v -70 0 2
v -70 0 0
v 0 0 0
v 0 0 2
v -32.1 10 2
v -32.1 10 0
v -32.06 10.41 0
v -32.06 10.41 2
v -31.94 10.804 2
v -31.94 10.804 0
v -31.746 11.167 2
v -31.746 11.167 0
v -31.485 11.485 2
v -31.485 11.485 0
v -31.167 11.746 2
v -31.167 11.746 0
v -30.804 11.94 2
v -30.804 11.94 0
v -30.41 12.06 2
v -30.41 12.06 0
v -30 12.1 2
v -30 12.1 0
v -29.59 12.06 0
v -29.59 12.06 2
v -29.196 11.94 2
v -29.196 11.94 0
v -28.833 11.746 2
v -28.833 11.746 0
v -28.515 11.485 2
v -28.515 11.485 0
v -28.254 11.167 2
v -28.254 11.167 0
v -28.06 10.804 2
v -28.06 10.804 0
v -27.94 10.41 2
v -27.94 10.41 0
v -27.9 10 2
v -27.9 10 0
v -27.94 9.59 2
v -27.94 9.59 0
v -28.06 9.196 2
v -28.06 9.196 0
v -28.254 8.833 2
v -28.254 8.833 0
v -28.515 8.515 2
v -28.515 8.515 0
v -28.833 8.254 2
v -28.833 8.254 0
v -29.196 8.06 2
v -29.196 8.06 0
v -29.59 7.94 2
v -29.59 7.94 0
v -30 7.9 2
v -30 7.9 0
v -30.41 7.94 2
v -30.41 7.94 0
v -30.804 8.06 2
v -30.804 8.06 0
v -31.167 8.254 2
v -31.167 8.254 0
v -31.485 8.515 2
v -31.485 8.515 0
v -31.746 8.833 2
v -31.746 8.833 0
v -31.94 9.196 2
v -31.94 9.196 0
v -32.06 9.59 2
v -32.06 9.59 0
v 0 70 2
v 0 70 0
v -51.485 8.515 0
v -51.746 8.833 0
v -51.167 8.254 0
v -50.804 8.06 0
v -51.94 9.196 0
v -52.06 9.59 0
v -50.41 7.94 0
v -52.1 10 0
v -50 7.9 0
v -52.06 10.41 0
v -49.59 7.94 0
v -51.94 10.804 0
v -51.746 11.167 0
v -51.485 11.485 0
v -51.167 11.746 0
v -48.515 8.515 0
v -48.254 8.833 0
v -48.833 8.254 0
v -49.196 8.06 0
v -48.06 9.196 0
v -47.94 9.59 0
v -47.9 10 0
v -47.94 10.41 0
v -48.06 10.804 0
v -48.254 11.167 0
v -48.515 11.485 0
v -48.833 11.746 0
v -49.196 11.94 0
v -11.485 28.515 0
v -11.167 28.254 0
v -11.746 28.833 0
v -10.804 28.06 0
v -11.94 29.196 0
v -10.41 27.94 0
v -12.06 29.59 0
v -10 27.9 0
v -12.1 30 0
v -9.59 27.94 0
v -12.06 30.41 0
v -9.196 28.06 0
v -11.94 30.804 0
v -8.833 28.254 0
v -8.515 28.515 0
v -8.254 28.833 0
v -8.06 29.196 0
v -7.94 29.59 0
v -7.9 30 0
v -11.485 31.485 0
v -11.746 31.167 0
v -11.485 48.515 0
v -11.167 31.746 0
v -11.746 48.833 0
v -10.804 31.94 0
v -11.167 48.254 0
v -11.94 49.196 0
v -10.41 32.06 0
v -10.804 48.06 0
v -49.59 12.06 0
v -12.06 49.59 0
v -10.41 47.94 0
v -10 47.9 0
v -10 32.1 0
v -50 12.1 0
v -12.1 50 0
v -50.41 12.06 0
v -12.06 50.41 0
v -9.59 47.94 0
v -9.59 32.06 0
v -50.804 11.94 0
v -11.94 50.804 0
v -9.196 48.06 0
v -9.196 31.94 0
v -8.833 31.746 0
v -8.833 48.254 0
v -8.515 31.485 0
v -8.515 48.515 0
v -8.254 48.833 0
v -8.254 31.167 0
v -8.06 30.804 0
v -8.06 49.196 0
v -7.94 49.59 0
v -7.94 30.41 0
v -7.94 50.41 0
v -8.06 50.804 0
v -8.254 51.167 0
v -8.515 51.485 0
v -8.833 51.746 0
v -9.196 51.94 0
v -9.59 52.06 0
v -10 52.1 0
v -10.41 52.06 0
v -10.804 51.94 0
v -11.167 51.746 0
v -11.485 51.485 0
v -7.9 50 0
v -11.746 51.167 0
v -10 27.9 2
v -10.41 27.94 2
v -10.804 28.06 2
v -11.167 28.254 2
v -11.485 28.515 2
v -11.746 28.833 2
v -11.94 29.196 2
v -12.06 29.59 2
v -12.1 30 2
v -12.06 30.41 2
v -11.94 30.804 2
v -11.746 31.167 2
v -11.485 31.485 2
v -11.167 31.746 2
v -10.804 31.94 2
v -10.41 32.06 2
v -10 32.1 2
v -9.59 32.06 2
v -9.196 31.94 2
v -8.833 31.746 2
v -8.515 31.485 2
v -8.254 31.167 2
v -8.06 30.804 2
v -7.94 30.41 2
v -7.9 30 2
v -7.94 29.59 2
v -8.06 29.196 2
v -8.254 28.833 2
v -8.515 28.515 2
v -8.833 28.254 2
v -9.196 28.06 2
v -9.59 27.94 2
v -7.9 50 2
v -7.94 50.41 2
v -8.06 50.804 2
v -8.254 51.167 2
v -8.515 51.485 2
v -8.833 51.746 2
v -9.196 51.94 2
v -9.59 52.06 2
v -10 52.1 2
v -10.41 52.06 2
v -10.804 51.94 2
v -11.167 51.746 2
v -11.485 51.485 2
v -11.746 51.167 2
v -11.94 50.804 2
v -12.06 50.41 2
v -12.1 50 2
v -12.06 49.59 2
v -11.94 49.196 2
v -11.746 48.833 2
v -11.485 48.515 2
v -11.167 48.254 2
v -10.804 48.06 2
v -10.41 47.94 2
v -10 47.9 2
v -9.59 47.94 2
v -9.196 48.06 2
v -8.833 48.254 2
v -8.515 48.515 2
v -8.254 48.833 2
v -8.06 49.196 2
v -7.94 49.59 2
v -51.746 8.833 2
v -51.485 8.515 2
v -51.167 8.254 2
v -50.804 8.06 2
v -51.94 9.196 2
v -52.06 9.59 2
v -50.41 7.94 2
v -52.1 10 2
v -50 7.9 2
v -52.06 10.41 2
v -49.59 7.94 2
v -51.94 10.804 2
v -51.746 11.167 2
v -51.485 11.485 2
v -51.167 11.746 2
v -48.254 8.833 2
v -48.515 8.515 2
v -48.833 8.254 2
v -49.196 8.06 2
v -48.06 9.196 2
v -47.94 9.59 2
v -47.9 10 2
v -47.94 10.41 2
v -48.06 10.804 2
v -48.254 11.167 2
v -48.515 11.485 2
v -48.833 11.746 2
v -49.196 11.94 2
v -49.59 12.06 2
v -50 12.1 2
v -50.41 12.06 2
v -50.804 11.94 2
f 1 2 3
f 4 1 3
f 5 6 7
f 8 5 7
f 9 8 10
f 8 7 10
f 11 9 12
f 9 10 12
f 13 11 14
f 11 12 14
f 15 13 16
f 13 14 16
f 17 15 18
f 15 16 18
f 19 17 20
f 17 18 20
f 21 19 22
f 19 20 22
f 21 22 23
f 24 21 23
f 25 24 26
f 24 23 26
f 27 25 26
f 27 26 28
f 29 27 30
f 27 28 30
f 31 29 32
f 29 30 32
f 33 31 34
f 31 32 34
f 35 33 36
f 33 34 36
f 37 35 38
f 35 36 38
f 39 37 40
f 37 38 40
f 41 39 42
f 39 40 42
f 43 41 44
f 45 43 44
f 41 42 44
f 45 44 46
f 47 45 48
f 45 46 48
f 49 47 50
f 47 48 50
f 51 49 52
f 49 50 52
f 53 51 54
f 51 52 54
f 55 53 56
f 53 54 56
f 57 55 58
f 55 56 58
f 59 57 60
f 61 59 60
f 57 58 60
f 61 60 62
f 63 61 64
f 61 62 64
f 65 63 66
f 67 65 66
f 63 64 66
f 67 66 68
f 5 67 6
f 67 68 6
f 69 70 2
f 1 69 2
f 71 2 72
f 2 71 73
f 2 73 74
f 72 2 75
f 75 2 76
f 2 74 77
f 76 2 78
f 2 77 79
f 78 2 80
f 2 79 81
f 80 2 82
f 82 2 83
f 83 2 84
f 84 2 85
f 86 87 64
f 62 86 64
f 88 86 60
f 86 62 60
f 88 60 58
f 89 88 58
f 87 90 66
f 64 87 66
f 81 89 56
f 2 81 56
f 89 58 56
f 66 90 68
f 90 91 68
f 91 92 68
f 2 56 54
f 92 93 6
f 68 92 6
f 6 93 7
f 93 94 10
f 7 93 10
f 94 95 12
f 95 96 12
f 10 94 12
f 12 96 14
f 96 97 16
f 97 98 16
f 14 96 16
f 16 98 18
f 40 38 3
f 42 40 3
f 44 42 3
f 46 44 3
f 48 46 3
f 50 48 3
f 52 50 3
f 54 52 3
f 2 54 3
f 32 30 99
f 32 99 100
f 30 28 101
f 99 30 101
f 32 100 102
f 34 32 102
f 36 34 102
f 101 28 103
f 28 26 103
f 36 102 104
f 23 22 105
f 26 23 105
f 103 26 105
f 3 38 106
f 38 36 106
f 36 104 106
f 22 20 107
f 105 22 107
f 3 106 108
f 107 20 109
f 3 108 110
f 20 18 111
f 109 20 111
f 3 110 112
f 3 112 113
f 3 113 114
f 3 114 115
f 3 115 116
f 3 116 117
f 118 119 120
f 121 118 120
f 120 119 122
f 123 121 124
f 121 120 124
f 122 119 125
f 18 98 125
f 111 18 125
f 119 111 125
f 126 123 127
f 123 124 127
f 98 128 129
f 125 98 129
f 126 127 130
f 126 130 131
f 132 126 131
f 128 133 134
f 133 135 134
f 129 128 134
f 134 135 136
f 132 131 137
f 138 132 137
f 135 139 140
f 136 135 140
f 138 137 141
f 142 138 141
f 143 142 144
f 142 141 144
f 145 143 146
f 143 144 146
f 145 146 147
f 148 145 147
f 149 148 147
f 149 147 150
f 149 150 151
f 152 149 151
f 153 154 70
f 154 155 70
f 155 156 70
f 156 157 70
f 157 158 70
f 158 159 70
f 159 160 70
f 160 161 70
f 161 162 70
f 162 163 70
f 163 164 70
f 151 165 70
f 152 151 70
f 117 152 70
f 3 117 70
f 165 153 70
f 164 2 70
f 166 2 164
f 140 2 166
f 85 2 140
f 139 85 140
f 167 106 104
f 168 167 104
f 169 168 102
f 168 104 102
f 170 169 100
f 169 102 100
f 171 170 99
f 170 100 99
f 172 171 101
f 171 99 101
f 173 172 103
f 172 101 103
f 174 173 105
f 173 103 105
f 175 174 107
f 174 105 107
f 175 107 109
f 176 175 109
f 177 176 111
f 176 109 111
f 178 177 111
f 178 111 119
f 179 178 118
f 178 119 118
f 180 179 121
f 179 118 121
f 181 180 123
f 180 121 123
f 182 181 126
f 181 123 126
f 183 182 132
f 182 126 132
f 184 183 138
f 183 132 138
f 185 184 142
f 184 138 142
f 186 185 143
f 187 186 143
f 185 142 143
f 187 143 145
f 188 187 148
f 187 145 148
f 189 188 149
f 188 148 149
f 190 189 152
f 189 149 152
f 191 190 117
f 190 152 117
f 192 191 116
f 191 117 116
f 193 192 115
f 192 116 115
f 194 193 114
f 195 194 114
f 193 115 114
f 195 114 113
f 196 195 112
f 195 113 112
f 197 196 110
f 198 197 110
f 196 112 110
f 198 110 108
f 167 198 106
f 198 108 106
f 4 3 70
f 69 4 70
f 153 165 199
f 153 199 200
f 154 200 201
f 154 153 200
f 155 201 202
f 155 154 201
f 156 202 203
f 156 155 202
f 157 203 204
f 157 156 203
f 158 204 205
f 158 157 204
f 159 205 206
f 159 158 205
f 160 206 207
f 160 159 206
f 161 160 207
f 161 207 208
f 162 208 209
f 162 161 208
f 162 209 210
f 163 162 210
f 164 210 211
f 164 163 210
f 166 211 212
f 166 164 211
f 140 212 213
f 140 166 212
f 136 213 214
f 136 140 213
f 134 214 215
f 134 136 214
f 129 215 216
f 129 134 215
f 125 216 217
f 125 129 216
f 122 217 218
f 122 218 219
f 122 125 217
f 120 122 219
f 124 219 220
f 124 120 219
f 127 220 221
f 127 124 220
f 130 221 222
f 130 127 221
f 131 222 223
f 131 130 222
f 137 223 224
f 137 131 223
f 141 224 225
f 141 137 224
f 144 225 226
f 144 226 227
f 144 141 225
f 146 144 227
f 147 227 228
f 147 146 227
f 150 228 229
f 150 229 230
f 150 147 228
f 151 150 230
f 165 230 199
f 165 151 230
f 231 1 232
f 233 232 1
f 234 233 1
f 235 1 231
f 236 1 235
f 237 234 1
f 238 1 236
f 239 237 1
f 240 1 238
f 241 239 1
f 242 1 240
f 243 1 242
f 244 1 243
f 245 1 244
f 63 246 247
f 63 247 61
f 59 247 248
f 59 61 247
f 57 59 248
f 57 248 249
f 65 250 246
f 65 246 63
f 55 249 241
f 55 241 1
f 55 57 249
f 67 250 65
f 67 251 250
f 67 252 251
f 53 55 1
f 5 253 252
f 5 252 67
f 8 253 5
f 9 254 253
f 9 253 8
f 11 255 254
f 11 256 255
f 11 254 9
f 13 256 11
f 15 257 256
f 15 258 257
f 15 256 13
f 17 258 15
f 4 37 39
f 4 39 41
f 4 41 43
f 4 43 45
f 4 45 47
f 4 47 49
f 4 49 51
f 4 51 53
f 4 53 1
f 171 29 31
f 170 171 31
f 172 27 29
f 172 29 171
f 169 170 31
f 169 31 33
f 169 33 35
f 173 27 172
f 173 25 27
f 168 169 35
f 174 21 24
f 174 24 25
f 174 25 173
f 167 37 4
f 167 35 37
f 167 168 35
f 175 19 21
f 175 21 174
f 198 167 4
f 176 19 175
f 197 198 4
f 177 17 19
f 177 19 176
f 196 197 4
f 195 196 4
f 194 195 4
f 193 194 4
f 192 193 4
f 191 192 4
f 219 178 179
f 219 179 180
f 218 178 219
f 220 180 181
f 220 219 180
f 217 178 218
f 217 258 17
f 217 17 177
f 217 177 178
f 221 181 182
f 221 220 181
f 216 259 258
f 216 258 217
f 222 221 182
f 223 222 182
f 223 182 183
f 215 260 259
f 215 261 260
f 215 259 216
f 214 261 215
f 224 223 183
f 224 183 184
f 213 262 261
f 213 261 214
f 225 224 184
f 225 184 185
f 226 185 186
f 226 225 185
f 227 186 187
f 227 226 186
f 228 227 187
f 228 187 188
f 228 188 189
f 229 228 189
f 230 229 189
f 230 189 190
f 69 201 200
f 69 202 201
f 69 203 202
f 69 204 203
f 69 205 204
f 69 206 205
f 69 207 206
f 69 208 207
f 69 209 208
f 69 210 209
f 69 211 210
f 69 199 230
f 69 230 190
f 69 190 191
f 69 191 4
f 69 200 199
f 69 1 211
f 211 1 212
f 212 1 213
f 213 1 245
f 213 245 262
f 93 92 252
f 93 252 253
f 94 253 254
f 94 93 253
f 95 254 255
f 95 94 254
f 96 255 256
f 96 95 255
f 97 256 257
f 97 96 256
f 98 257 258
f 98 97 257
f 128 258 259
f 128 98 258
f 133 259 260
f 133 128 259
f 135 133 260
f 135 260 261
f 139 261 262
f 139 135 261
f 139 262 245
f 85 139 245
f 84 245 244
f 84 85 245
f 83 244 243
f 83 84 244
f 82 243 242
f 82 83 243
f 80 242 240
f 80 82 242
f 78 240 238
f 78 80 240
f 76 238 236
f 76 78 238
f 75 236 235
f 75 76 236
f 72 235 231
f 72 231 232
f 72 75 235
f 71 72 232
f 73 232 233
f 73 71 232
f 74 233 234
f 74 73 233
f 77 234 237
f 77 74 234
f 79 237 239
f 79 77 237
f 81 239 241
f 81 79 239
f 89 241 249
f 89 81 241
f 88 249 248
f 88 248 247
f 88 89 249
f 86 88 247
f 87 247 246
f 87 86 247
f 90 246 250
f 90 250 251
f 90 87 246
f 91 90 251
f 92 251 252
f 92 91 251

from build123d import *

# Parameters (mm, degrees)
SKETCH_1_R      = 2.1
EXTRUDE_1_DEPTH = 2


with BuildPart() as part:
    # ｽｹｯﾁ1 → ﾎﾞｽ - 押し出し1 (new body)
    with BuildSketch(Plane.XY):
        Polygon((0, 0), (0, 70), (-70, 0), align=None)
        with Locations((-50, 10)):
            Circle(SKETCH_1_R, mode=Mode.SUBTRACT)
        with BuildLine():
            ThreePointArc((-27.9, 10), (-30, 7.9), (-32.1, 10))
            ThreePointArc((-32.1, 10), (-30, 12.1), (-27.9, 10))
        make_face(mode=Mode.SUBTRACT)
        with BuildLine():
            ThreePointArc((-10, 32.1), (-7.9, 30), (-10, 27.9))
            ThreePointArc((-10, 27.9), (-12.1, 30), (-10, 32.1))
        make_face(mode=Mode.SUBTRACT)
        with Locations((-10, 50)):
            Circle(SKETCH_1_R, mode=Mode.SUBTRACT)
    extrude(amount=EXTRUDE_1_DEPTH)


solid = part.part
